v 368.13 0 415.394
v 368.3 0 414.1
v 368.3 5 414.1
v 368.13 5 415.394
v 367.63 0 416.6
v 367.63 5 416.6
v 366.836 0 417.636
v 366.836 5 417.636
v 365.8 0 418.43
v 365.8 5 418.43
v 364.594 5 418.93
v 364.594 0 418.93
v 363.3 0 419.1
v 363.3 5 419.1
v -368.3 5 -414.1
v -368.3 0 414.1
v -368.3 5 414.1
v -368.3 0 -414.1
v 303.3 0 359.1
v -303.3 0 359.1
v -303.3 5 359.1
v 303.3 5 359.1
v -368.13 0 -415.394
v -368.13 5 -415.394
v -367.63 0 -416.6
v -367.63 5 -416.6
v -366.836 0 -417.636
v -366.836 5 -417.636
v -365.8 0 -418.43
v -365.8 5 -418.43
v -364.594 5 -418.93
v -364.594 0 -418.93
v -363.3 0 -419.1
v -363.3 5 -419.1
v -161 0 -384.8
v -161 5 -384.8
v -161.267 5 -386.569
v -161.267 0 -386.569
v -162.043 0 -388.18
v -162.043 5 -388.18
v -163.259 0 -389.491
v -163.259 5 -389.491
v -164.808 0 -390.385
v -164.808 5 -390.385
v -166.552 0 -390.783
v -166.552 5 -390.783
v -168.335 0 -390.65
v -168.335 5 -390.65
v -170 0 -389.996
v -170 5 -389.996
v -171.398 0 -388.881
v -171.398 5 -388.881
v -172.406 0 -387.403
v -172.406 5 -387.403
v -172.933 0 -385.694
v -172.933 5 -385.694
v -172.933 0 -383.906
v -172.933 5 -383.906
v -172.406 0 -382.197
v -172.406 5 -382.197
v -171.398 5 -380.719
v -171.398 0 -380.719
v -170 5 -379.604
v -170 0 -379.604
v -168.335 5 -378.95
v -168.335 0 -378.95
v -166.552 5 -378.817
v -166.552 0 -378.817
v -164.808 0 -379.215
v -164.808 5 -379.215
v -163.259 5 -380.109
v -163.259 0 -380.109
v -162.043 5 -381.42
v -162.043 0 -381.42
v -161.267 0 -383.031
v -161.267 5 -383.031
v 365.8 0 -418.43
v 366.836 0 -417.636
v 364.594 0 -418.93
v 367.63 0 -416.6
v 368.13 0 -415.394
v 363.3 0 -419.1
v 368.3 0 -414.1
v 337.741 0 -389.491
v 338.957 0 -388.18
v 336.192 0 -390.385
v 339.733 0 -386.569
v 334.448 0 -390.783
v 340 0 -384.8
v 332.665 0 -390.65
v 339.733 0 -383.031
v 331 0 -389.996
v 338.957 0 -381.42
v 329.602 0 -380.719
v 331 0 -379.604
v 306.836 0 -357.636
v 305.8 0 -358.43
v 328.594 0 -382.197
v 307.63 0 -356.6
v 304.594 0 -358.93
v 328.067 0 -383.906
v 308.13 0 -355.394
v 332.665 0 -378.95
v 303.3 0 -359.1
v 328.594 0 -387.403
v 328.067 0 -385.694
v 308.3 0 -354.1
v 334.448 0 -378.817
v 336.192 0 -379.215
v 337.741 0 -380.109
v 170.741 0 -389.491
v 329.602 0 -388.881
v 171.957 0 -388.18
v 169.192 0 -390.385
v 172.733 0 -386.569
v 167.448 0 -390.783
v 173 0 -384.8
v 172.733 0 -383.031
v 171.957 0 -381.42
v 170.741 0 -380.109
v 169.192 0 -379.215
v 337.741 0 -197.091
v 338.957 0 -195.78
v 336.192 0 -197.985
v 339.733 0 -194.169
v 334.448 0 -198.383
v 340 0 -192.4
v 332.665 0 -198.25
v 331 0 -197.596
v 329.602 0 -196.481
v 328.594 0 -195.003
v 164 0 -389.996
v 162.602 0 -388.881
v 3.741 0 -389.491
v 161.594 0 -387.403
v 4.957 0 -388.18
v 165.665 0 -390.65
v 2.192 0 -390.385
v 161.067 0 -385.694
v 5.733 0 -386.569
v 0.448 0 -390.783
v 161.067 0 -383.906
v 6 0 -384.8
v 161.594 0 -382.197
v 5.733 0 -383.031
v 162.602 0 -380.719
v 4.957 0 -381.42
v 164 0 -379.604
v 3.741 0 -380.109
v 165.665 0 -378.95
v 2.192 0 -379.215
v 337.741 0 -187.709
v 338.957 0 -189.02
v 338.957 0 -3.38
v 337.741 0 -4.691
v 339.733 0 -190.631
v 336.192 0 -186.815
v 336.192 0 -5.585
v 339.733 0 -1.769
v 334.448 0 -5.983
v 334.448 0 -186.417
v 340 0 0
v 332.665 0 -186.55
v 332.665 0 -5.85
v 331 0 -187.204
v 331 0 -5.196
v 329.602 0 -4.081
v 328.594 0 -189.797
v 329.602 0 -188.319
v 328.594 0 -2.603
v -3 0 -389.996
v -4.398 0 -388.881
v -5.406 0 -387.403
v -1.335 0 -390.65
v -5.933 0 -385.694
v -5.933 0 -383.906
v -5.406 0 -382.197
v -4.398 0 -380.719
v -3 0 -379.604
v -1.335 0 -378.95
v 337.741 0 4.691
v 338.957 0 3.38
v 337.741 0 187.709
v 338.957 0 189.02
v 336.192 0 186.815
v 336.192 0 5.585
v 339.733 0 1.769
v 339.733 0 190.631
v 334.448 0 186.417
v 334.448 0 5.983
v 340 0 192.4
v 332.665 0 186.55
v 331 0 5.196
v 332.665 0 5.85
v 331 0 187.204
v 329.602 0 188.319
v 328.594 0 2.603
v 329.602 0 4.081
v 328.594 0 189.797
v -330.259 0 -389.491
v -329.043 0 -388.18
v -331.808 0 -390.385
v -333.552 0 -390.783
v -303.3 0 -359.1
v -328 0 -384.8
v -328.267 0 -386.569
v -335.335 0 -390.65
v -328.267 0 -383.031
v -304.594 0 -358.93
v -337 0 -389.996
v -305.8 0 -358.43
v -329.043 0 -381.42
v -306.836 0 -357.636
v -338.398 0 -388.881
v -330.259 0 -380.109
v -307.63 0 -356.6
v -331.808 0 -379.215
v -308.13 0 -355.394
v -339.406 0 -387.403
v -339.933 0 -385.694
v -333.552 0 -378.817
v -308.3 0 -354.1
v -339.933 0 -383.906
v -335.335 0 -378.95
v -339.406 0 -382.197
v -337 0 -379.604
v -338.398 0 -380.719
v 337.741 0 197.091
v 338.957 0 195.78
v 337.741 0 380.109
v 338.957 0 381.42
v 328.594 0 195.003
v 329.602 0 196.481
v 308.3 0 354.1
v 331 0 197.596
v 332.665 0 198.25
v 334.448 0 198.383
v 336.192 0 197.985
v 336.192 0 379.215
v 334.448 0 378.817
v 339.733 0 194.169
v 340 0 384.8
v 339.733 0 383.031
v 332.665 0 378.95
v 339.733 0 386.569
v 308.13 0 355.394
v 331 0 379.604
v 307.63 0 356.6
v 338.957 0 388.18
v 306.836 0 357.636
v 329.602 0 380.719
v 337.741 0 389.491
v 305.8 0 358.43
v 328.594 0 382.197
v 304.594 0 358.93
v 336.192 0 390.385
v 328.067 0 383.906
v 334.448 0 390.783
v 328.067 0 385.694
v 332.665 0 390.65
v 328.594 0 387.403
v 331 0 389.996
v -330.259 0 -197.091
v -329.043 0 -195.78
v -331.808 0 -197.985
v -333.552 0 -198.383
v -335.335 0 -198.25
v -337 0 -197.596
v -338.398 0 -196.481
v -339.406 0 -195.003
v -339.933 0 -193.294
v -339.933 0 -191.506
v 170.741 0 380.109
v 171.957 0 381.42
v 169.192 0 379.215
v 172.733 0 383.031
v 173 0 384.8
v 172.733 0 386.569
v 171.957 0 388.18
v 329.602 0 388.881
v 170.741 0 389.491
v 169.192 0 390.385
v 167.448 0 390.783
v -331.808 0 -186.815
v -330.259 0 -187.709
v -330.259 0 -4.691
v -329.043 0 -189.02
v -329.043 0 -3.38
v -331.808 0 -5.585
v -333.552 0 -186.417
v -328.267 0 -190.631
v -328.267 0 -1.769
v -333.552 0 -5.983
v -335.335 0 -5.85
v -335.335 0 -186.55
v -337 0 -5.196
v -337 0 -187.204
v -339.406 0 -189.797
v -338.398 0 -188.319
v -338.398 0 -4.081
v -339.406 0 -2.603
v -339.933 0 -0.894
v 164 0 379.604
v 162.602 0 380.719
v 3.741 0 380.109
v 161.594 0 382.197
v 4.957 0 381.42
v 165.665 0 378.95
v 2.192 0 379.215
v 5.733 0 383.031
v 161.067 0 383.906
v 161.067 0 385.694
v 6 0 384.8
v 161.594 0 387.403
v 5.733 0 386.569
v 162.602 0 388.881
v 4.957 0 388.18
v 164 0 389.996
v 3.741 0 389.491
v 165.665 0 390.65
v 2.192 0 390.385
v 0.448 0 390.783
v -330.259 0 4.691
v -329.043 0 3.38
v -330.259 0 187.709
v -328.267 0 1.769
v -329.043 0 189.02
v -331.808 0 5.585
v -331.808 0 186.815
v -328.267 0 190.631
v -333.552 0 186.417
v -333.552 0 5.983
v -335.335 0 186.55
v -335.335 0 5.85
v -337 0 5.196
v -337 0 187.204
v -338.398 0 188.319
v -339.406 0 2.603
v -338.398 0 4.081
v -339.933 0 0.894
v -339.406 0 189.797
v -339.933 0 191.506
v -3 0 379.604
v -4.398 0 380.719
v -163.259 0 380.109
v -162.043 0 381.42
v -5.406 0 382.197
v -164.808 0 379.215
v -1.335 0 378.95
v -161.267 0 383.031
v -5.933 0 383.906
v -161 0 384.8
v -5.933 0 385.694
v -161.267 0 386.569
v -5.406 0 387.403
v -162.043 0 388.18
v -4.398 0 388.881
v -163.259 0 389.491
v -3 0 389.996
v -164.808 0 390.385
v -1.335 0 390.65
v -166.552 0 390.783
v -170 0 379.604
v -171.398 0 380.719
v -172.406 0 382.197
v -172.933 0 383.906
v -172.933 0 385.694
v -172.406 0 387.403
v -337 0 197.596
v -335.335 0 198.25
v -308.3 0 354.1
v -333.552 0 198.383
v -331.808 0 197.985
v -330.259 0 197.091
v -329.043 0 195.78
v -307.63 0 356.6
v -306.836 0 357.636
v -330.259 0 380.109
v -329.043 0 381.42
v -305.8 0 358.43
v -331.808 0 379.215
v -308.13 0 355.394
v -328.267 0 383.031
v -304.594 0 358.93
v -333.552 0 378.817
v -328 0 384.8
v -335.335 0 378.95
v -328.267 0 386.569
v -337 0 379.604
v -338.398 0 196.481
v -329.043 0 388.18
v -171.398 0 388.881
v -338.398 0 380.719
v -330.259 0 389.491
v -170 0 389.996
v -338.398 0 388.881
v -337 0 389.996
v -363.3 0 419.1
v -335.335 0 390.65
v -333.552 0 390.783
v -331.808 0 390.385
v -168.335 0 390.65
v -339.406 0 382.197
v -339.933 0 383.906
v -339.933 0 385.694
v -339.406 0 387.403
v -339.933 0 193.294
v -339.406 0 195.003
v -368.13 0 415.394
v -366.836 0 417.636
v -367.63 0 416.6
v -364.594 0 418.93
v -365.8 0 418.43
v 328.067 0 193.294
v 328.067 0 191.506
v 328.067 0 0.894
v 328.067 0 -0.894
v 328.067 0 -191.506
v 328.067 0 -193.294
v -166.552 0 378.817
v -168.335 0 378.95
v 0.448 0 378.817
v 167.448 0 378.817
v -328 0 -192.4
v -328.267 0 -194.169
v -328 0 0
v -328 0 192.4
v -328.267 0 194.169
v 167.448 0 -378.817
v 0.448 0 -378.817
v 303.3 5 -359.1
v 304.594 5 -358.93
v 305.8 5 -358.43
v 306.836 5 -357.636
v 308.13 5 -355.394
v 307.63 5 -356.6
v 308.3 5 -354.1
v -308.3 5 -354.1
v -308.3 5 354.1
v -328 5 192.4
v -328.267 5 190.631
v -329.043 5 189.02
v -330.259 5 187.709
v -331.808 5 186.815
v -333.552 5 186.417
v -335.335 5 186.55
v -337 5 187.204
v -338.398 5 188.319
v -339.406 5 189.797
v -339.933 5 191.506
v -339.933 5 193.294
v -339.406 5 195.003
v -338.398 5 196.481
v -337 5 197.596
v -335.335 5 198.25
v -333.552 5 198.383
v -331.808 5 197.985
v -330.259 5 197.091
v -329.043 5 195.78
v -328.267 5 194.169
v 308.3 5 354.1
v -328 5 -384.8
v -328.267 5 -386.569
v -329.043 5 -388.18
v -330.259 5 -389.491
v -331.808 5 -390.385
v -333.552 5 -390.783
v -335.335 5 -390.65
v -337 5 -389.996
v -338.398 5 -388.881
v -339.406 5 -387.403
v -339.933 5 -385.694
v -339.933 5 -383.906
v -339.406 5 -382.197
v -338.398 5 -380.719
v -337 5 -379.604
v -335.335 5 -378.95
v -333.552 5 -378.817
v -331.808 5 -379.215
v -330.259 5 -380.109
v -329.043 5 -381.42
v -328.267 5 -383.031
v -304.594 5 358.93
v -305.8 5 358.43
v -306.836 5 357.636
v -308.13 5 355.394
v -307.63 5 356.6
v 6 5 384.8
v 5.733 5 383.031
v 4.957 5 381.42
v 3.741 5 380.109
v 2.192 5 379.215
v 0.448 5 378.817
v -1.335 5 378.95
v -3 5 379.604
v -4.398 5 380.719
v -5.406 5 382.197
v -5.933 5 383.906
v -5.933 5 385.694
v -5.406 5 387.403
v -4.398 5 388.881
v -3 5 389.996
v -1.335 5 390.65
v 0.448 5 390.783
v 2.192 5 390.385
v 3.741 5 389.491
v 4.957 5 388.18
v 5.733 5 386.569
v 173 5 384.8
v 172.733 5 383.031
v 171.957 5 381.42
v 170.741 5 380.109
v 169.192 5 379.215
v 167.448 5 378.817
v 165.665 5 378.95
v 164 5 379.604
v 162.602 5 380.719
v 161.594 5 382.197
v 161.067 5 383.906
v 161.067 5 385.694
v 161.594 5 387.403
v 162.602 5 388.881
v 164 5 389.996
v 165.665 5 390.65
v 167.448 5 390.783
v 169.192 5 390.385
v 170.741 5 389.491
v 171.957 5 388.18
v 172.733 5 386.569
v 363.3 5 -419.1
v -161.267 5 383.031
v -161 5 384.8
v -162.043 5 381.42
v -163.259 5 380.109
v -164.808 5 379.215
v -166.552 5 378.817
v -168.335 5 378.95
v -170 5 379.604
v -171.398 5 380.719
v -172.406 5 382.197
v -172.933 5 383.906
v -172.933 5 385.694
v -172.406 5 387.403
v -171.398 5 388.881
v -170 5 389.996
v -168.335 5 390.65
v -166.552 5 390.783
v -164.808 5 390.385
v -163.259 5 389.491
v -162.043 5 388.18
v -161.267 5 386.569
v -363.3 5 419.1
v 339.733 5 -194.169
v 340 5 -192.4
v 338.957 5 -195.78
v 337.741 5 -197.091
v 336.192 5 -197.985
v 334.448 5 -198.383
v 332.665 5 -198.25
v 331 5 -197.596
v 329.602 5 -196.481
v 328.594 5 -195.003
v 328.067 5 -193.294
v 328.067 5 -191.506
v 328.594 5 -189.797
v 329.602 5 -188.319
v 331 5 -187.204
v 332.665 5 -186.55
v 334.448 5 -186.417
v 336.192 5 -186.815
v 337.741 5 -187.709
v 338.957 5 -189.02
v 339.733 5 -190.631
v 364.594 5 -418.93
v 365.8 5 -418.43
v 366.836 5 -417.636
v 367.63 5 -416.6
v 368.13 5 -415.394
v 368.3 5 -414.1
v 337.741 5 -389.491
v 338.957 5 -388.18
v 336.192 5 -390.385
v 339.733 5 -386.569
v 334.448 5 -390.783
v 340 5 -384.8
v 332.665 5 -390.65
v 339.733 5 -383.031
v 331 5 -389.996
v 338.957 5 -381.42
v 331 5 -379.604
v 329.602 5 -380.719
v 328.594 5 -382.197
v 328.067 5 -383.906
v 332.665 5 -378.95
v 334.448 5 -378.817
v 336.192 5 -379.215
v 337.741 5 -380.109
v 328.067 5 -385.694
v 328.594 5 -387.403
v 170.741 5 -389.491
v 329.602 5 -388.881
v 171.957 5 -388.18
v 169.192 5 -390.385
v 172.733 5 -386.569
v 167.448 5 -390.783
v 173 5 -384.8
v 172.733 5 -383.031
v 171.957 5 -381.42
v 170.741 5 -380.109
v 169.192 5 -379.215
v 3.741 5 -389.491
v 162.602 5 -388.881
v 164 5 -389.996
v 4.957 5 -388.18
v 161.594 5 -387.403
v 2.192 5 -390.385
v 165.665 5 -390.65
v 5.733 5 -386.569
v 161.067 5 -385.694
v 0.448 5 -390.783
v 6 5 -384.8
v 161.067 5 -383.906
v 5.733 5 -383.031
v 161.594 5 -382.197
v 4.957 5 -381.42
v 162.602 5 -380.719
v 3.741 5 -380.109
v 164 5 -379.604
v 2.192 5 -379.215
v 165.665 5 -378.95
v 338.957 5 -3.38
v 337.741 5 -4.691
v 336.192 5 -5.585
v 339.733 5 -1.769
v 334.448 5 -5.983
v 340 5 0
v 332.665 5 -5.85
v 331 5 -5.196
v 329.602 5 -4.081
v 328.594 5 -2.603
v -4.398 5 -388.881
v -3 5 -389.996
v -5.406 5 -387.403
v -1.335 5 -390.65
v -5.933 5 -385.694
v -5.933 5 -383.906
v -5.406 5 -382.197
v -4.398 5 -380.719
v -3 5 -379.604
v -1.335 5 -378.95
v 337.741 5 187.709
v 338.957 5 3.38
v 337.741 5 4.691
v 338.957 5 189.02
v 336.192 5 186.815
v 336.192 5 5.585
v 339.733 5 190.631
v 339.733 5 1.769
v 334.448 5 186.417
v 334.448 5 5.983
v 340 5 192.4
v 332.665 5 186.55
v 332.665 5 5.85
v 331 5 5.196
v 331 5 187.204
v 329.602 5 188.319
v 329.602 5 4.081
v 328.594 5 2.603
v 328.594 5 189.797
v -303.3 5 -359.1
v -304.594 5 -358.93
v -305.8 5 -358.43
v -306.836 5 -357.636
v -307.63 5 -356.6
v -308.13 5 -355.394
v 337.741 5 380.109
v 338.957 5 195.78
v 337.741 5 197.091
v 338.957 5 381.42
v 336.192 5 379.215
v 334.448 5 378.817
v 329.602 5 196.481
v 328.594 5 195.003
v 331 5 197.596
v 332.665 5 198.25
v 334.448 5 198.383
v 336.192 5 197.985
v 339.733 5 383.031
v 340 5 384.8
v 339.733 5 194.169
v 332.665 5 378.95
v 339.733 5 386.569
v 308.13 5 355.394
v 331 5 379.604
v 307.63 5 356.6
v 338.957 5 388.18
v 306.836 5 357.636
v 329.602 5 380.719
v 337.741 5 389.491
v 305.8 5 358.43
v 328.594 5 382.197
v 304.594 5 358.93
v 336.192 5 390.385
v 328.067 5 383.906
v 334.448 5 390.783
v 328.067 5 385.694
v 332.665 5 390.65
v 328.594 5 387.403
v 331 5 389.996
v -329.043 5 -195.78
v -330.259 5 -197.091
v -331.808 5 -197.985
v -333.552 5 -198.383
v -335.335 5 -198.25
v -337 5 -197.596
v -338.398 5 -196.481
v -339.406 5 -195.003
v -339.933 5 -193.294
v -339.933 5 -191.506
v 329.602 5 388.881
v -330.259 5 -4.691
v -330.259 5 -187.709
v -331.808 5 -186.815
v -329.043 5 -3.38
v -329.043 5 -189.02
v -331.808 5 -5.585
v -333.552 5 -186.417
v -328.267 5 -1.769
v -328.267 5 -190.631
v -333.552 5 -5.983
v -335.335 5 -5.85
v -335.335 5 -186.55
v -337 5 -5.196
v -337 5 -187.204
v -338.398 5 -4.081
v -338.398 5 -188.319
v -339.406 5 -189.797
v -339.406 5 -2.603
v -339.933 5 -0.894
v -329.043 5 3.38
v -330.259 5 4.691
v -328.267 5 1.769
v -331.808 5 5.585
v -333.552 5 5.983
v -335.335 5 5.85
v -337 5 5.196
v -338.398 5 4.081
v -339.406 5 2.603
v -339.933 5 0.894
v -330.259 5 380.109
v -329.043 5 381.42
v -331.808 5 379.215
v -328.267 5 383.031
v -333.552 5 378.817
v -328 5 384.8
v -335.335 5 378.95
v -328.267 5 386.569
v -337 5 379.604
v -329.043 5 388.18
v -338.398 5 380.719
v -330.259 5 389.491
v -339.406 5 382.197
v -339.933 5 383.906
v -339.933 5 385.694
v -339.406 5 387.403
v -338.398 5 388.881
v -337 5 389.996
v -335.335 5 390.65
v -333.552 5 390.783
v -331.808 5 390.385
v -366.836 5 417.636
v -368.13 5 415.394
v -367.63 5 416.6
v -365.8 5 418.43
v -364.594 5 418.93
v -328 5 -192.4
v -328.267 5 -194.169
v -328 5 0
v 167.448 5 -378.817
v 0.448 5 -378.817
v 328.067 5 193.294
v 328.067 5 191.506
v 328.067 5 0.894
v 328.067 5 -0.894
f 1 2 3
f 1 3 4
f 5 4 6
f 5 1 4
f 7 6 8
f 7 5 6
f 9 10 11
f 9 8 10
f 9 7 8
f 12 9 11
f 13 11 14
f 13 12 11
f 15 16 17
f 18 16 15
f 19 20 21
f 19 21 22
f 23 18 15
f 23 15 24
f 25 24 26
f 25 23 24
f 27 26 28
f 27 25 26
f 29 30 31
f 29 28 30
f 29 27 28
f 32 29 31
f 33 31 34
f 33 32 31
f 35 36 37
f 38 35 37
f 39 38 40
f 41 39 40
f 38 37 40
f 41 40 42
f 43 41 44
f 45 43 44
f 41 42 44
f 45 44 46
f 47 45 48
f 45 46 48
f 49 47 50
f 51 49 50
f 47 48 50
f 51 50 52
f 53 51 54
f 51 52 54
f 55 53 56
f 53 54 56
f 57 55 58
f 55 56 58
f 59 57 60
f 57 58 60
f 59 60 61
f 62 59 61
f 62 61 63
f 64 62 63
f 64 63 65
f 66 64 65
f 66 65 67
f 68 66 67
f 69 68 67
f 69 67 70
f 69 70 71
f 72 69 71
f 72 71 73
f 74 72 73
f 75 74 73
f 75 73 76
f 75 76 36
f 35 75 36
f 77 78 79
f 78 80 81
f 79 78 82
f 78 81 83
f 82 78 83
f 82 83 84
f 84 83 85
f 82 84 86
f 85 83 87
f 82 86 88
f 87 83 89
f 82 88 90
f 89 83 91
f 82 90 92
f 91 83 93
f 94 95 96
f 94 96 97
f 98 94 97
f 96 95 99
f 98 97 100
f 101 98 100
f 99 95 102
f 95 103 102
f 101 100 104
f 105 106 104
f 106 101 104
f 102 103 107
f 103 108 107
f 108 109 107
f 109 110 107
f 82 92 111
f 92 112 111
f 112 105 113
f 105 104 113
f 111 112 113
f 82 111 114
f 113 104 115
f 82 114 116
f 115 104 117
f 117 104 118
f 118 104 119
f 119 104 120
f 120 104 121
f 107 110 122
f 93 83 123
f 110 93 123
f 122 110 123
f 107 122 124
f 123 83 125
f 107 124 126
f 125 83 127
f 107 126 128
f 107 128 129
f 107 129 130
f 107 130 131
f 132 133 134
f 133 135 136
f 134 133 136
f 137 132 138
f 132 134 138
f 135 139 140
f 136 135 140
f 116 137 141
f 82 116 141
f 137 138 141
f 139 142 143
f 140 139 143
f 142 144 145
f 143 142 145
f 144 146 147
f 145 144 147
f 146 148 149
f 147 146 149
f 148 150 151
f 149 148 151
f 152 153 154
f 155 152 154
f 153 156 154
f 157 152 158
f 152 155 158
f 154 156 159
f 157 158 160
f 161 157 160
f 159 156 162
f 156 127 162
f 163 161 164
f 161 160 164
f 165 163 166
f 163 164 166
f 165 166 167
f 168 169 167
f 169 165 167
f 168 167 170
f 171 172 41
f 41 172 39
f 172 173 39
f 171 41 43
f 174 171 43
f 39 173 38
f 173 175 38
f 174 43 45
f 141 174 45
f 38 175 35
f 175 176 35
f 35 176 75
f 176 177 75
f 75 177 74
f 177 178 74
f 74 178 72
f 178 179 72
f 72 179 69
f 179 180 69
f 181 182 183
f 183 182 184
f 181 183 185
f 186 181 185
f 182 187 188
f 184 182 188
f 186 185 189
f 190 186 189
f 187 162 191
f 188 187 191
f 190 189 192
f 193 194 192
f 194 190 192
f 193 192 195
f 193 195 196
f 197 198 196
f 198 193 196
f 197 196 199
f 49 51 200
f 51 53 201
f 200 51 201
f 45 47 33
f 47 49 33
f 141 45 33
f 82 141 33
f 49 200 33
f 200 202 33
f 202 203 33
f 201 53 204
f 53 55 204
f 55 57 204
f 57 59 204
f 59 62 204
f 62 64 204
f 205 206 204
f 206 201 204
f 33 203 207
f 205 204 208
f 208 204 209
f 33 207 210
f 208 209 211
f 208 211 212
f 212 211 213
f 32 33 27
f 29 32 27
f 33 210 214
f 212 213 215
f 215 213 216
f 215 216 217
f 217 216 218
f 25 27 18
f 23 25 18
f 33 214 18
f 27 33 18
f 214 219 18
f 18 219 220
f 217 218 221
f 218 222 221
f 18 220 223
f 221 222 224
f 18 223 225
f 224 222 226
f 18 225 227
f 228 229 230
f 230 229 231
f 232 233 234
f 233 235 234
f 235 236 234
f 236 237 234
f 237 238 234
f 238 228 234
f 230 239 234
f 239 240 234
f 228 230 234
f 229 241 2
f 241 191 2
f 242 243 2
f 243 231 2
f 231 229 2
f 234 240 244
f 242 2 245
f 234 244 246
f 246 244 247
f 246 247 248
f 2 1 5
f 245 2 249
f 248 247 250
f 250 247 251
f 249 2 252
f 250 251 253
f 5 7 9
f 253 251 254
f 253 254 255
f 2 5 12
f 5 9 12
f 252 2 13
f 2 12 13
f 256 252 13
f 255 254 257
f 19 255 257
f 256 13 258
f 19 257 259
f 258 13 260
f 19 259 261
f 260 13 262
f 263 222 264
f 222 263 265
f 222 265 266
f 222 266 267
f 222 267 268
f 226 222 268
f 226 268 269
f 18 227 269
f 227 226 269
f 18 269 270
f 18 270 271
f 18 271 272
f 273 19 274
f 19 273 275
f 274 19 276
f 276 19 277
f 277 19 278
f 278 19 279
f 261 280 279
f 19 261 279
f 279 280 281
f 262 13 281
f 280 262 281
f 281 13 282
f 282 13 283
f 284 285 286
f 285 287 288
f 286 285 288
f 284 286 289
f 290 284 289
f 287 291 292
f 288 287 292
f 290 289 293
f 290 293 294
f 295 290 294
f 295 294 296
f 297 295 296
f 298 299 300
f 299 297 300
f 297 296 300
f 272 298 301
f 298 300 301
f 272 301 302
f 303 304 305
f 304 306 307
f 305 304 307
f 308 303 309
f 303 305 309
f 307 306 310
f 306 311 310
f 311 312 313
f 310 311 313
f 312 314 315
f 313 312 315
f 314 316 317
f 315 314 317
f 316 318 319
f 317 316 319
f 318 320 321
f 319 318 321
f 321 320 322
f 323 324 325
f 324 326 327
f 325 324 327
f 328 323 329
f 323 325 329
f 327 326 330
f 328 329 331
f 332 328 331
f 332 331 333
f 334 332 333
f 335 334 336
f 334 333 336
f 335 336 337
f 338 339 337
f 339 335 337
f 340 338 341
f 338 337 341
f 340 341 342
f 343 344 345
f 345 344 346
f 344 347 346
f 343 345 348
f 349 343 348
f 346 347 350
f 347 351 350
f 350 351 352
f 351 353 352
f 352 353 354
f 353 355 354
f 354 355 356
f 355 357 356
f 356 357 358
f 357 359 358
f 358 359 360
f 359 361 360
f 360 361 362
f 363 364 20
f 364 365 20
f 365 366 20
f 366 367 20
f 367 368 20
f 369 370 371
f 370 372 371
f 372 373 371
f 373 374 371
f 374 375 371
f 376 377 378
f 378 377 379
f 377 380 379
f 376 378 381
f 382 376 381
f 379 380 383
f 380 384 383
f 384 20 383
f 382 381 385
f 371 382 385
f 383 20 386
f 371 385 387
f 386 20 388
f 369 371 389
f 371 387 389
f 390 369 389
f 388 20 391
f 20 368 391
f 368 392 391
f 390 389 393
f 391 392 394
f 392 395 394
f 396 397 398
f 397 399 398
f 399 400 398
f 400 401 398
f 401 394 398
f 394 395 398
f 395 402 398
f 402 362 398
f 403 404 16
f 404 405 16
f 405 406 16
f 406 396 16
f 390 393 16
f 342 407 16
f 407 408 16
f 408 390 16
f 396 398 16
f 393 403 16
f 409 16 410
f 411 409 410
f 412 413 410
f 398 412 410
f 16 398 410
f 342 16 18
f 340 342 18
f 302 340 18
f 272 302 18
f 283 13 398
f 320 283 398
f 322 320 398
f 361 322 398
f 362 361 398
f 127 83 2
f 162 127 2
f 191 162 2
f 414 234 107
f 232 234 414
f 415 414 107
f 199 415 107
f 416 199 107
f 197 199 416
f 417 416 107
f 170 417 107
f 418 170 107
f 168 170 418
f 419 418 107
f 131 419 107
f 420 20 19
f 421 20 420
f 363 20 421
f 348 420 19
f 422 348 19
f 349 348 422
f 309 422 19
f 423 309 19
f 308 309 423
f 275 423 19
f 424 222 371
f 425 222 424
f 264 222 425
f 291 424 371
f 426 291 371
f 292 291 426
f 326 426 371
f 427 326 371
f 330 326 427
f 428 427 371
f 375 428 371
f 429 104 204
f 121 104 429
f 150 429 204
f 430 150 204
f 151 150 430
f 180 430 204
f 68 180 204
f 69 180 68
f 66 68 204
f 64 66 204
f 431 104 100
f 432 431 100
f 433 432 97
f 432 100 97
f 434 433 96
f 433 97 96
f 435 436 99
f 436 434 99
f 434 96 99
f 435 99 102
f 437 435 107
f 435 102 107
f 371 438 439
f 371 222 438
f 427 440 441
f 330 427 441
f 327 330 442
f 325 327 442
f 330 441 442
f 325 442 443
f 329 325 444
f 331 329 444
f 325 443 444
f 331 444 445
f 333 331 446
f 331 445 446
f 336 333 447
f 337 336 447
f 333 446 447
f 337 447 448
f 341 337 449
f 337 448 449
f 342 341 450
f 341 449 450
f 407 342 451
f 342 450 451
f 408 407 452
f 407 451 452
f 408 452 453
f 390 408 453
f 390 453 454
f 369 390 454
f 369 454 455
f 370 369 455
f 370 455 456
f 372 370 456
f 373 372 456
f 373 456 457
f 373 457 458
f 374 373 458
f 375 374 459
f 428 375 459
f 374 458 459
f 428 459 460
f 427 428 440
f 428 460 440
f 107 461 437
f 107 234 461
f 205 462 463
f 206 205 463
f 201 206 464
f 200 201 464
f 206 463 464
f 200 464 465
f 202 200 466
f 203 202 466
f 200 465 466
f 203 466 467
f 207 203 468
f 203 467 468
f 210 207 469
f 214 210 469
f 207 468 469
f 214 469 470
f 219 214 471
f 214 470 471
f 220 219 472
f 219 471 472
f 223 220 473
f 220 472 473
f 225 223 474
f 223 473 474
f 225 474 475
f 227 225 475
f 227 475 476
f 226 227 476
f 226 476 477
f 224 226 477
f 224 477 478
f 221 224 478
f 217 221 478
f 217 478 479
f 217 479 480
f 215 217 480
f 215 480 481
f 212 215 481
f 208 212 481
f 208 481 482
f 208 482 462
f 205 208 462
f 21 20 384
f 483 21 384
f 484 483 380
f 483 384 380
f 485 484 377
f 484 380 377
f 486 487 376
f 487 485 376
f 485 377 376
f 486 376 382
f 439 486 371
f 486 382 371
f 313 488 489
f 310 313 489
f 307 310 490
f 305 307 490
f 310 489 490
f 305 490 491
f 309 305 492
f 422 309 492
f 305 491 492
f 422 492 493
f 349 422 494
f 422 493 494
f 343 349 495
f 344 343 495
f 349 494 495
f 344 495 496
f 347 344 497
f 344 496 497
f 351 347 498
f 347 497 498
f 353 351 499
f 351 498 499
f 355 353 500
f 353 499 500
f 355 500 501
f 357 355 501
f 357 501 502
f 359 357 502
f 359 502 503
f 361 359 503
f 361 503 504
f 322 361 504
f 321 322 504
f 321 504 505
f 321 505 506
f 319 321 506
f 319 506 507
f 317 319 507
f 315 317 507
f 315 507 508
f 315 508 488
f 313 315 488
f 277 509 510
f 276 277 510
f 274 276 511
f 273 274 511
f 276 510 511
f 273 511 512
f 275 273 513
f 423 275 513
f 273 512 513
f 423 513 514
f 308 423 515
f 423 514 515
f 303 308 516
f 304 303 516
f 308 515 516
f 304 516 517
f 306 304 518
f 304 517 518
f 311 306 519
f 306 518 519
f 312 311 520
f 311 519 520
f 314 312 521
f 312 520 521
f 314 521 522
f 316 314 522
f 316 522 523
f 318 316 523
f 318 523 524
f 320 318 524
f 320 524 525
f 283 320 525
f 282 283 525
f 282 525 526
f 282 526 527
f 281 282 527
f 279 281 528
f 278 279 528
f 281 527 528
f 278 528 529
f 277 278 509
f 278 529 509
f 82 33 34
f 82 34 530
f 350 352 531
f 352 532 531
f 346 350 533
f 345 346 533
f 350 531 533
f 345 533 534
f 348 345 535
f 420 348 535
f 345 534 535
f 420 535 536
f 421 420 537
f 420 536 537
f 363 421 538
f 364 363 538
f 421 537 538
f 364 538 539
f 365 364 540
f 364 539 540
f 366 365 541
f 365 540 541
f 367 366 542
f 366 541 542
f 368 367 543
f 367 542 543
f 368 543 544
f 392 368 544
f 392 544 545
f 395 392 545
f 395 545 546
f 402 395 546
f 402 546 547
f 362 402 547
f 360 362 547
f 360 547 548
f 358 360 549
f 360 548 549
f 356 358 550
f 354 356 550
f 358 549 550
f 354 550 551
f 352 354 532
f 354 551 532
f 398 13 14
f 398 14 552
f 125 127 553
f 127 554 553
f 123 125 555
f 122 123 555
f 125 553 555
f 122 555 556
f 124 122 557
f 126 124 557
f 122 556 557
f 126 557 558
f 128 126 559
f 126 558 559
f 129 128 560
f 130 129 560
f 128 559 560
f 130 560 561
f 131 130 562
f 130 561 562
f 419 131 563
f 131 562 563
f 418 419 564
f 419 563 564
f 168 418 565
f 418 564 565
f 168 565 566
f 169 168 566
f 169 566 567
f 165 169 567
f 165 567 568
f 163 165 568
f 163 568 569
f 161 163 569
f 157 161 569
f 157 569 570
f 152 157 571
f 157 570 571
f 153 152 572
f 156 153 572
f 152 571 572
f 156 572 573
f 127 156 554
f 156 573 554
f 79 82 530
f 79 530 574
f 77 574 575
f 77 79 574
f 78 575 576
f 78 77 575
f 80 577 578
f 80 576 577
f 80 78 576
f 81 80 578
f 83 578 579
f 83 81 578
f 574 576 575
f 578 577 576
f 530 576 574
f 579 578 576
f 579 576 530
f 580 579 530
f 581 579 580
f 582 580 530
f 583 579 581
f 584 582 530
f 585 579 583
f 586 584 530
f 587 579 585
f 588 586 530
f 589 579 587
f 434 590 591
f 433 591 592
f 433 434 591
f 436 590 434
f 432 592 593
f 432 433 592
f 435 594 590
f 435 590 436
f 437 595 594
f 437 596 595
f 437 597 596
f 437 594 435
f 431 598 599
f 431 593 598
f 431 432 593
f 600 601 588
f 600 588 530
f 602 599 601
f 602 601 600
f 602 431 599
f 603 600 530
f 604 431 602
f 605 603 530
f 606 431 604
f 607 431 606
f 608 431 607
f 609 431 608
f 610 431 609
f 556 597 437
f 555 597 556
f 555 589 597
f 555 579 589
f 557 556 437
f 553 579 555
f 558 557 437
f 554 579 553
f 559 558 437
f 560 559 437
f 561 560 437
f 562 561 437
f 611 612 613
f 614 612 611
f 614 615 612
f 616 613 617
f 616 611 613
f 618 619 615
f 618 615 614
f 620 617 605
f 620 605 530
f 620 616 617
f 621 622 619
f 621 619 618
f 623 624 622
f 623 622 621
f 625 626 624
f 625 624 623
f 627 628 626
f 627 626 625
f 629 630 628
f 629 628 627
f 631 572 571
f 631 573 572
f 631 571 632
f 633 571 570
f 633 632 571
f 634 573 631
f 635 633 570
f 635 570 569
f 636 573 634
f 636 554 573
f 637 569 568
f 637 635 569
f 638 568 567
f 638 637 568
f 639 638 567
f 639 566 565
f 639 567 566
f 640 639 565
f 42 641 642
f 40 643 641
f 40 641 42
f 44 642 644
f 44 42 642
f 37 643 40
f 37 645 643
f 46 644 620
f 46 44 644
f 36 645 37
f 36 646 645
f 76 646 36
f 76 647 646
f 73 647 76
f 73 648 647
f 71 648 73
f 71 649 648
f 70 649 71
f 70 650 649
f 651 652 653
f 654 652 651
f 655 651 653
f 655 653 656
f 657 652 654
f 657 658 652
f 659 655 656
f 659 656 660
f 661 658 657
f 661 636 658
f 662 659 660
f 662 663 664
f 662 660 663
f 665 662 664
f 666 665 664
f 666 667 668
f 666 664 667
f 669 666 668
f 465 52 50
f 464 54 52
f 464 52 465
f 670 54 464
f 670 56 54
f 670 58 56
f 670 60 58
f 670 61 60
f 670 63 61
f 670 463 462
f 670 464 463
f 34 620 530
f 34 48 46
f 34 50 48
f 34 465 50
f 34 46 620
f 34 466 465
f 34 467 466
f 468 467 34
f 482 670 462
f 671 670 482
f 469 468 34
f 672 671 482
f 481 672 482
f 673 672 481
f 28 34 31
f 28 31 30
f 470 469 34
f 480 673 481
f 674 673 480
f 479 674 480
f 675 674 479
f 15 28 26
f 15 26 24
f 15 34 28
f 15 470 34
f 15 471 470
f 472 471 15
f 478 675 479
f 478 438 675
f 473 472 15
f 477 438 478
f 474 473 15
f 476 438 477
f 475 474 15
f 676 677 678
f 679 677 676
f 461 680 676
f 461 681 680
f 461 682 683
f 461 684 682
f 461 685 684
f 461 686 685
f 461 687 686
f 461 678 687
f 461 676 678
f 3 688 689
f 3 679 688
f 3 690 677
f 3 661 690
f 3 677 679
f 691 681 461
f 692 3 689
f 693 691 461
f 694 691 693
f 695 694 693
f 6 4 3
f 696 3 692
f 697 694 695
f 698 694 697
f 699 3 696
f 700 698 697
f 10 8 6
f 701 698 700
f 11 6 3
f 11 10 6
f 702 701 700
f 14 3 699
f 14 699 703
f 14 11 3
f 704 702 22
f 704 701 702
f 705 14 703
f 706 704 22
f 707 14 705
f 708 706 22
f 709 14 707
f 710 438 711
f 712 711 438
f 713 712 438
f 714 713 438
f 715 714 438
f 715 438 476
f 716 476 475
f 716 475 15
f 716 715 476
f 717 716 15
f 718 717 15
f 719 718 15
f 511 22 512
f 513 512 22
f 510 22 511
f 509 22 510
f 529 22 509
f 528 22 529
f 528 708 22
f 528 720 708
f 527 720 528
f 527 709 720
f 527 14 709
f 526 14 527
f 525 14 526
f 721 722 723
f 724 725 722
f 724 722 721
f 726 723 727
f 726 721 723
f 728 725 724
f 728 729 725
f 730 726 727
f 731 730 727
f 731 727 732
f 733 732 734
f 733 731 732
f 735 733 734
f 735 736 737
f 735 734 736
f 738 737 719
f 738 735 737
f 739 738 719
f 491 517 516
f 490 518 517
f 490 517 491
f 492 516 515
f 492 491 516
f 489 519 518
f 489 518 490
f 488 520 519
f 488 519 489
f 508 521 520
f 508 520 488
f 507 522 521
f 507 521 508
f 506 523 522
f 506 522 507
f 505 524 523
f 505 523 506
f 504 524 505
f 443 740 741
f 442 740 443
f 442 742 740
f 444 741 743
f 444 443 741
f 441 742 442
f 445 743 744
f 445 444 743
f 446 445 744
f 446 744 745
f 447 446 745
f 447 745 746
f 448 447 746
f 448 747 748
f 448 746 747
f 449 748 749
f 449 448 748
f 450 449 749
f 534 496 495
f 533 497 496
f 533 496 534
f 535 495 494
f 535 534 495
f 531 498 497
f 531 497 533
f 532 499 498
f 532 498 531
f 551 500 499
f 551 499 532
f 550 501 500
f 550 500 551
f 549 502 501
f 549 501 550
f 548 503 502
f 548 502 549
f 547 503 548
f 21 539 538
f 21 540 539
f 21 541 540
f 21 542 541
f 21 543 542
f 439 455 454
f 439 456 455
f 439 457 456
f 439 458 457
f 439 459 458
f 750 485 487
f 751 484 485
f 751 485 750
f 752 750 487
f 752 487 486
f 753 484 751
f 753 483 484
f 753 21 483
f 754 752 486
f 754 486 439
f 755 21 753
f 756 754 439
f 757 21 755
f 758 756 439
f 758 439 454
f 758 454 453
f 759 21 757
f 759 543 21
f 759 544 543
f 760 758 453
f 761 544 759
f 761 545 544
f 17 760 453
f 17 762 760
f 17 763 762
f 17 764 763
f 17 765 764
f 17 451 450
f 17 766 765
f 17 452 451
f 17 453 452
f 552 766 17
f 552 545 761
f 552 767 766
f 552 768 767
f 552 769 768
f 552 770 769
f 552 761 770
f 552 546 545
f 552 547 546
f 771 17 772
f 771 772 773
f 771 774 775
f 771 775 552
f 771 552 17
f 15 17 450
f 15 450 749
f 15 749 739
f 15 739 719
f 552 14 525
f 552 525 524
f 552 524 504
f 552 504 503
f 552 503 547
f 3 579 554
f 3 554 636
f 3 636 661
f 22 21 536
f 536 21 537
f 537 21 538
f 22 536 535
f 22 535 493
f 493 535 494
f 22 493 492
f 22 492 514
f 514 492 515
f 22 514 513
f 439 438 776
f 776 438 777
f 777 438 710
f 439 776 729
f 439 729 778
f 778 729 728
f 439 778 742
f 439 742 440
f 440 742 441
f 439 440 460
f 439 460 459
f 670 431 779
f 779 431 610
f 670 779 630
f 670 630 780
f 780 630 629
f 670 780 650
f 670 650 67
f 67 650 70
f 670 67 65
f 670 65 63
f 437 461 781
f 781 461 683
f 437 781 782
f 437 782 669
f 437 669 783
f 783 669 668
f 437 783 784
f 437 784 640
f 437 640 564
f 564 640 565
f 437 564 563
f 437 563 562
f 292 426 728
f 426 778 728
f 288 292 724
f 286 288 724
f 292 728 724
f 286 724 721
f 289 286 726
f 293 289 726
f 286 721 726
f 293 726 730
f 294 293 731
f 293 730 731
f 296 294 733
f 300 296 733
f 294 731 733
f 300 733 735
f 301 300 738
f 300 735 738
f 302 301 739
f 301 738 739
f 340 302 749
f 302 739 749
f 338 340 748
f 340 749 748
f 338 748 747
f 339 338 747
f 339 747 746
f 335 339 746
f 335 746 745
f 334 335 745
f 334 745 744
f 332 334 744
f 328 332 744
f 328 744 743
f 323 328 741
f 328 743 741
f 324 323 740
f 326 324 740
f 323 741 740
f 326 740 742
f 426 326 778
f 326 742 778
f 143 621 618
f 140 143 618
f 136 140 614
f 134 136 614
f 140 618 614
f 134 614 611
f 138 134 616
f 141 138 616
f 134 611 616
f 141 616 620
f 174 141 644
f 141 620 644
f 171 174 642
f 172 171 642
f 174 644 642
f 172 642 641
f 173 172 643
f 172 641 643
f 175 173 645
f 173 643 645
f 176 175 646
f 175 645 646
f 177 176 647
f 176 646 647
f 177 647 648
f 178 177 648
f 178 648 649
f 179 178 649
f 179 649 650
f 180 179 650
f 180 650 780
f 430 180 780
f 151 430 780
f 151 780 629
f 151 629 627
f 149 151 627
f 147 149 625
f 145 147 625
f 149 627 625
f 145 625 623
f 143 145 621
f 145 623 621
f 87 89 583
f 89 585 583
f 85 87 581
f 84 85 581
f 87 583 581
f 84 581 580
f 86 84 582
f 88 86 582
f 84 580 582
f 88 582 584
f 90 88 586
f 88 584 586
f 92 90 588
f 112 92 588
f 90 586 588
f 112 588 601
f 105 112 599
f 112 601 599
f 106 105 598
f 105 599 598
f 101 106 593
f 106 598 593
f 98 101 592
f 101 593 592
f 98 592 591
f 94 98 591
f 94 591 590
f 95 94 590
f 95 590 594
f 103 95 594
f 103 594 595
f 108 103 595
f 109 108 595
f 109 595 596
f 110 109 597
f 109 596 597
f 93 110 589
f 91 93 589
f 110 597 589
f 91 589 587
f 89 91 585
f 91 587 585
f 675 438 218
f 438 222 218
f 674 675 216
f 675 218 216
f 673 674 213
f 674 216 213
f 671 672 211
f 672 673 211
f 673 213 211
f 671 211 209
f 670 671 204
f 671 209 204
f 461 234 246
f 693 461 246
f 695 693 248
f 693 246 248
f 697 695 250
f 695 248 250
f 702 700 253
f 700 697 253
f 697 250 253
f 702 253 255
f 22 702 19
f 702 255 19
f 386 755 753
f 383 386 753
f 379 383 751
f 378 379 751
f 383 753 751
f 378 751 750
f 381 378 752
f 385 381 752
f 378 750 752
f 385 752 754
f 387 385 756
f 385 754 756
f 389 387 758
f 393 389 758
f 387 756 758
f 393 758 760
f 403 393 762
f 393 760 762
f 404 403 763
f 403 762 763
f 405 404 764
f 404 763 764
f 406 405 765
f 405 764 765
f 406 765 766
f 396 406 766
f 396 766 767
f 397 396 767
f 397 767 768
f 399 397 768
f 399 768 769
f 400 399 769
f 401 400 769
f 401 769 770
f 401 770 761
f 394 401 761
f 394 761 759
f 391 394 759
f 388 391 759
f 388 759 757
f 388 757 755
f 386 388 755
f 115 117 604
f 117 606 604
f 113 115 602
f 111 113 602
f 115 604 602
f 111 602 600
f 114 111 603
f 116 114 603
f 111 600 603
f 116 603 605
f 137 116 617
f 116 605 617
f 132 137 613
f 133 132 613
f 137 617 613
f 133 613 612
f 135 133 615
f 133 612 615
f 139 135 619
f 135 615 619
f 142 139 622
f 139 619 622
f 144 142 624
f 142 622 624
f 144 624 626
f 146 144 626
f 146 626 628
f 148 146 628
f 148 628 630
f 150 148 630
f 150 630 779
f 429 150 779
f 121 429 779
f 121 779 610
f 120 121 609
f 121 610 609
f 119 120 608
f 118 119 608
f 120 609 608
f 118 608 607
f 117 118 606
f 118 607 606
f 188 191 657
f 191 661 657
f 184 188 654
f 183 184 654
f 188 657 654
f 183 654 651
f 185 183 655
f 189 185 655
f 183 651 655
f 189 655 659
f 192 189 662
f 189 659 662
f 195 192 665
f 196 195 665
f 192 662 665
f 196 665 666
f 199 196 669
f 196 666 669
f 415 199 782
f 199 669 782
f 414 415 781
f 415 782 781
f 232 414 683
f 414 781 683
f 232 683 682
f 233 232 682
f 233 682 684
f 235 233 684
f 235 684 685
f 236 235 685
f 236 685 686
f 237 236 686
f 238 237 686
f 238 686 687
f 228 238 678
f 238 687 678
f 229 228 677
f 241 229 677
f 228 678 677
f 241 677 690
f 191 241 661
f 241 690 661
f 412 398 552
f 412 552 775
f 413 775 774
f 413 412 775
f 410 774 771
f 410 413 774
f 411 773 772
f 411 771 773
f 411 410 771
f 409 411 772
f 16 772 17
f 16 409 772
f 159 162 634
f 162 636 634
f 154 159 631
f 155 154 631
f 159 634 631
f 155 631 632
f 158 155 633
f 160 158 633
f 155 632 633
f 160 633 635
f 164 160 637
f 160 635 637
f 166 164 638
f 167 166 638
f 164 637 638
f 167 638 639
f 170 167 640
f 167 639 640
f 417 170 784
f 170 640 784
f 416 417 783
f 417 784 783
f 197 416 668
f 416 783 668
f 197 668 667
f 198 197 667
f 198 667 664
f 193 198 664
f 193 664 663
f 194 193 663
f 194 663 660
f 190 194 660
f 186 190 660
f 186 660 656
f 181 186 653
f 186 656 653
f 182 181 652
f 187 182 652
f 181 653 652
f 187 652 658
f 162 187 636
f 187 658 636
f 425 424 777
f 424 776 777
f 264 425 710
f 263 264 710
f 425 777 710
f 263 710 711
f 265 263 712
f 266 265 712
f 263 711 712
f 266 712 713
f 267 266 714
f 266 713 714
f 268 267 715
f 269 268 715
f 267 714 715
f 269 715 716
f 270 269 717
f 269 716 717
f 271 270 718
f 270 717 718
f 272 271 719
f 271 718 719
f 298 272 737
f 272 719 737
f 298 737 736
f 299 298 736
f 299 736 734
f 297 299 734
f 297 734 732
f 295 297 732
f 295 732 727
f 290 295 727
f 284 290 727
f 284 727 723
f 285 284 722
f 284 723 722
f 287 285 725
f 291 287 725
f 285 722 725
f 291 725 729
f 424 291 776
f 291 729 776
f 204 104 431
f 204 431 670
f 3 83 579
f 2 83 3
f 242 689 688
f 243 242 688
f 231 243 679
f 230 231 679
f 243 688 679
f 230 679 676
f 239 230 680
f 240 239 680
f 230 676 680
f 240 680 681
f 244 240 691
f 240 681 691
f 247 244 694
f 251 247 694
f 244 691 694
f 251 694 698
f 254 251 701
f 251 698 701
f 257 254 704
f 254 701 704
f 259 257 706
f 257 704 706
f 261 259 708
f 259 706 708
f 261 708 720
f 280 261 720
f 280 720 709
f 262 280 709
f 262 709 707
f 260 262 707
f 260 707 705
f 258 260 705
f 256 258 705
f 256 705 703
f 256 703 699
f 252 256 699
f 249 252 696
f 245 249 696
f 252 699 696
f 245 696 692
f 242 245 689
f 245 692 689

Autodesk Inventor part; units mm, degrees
ref_plane "YZ Plane" through (0, 0, 0) normal (1, 0, 0) x (0, 1, 0)
ref_plane "XZ Plane" through (0, 0, 0) normal (0, 1, 0) x (-1, 0, 0)
ref_plane "XY Plane" through (0, 0, 0) normal (0, 0, 1) x (1, 0, 0)
sketch "Sketch1" plane through (0, 0, 0) normal (0, 1, 0) x (-1, 0, 0)
  line L0 (-363.3, 419.1) -> (363.3, 419.1)
  line L1 (368.3, 414.1) -> (368.3, -414.1)
  line L2 (363.3, -419.1) -> (-363.3, -419.1)
  line L3 (-368.3, -414.1) -> (-368.3, 414.1)
  line L4 (-368.3, 419.1) -> (368.3, -419.1) construction
  line L5 (368.3, 419.1) -> (-368.3, -419.1) construction
  line L6 (303.3, 359.1) -> (-303.3, 359.1)
  line L7 (-308.3, 354.1) -> (-308.3, -354.1)
  line L8 (-303.3, -359.1) -> (303.3, -359.1)
  line L9 (308.3, -354.1) -> (308.3, 354.1)
  arc A0 (308.3, 354.1) -> (303.3, 359.1) centre (303.3, 354.1) ccw
  arc A1 (303.3, -359.1) -> (308.3, -354.1) centre (303.3, -354.1) ccw
  arc A2 (-303.3, 359.1) -> (-308.3, 354.1) centre (-303.3, 354.1) ccw
  arc A3 (-308.3, -354.1) -> (-303.3, -359.1) centre (-303.3, -354.1) ccw
  arc A4 (368.3, 414.1) -> (363.3, 419.1) centre (363.3, 414.1) ccw
  arc A5 (-363.3, 419.1) -> (-368.3, 414.1) centre (-363.3, 414.1) ccw
  arc A6 (-368.3, -414.1) -> (-363.3, -419.1) centre (-363.3, -414.1) ccw
  arc A7 (363.3, -419.1) -> (368.3, -414.1) centre (363.3, -414.1) ccw
  point P0 (0, 0)
  dimension "d0" = 736.6
  dimension "d1" = 838.2
  dimension "d2" = 60
  dimension "d4" = 5
extrude "Extrusion1" add sketch "Sketch1" along normal blind 5
sketch "Sketch2" plane through (0, 5, 0) normal (0, 1, 0) x (1, 0, 0)
  circle A0 centre (-334, 384.8) radius 6 projected
  circle A1 centre (-250.5, 384.8) radius 6 projected
  circle A2 centre (-167, 384.8) radius 6 projected
  circle A3 centre (-83.5, 384.8) radius 6 projected
  circle A4 centre (0, 384.8) radius 6 projected
  circle A5 centre (83.5, 384.8) radius 6 projected
  circle A6 centre (-334, 288.6) radius 6 projected
  circle A7 centre (-334, 96.2) radius 6 projected
  circle A8 centre (-334, -96.2) radius 6 projected
  circle A9 centre (-334, -192.4) radius 6 projected
  circle A10 centre (-334, -288.6) radius 6 projected
  circle A11 centre (-334, -384.8) radius 6 projected
  circle A12 centre (-334, 0) radius 6 projected
  circle A13 centre (-334, 192.4) radius 6 projected
  circle A14 centre (-250.5, -384.8) radius 6 projected
  circle A15 centre (-167, -384.8) radius 6 projected
  circle A16 centre (-83.5, -384.8) radius 6 projected
  circle A17 centre (0, -384.8) radius 6 projected
  circle A18 centre (83.5, -384.8) radius 6 projected
  circle A19 centre (167, -384.8) radius 6 projected
  circle A20 centre (250.5, -384.8) radius 6 projected
  circle A21 centre (334, -384.8) radius 6 projected
  circle A22 centre (334, -288.6) radius 6 projected
  circle A23 centre (334, -192.4) radius 6 projected
  circle A24 centre (334, -96.2) radius 6 projected
  circle A25 centre (334, 0) radius 6 projected
  circle A26 centre (334, 96.2) radius 6 projected
  circle A27 centre (334, 192.4) radius 6 projected
  circle A28 centre (334, 288.6) radius 6 projected
  circle A29 centre (334, 384.8) radius 6 projected
  circle A30 centre (167, 384.8) radius 6 projected
  circle A31 centre (250.5, 384.8) radius 6 projected
  point P0 (0, 0)
extrude "Extrusion2" cut sketch "Sketch2" against normal up to next contours A0 | A2 | A4 | A9 | A11 | A12 | A13 | A15 | A17 | A19 | A21 | A23 | A25 | A27 | A29 | A30
properties part number "H3NE-FF"
